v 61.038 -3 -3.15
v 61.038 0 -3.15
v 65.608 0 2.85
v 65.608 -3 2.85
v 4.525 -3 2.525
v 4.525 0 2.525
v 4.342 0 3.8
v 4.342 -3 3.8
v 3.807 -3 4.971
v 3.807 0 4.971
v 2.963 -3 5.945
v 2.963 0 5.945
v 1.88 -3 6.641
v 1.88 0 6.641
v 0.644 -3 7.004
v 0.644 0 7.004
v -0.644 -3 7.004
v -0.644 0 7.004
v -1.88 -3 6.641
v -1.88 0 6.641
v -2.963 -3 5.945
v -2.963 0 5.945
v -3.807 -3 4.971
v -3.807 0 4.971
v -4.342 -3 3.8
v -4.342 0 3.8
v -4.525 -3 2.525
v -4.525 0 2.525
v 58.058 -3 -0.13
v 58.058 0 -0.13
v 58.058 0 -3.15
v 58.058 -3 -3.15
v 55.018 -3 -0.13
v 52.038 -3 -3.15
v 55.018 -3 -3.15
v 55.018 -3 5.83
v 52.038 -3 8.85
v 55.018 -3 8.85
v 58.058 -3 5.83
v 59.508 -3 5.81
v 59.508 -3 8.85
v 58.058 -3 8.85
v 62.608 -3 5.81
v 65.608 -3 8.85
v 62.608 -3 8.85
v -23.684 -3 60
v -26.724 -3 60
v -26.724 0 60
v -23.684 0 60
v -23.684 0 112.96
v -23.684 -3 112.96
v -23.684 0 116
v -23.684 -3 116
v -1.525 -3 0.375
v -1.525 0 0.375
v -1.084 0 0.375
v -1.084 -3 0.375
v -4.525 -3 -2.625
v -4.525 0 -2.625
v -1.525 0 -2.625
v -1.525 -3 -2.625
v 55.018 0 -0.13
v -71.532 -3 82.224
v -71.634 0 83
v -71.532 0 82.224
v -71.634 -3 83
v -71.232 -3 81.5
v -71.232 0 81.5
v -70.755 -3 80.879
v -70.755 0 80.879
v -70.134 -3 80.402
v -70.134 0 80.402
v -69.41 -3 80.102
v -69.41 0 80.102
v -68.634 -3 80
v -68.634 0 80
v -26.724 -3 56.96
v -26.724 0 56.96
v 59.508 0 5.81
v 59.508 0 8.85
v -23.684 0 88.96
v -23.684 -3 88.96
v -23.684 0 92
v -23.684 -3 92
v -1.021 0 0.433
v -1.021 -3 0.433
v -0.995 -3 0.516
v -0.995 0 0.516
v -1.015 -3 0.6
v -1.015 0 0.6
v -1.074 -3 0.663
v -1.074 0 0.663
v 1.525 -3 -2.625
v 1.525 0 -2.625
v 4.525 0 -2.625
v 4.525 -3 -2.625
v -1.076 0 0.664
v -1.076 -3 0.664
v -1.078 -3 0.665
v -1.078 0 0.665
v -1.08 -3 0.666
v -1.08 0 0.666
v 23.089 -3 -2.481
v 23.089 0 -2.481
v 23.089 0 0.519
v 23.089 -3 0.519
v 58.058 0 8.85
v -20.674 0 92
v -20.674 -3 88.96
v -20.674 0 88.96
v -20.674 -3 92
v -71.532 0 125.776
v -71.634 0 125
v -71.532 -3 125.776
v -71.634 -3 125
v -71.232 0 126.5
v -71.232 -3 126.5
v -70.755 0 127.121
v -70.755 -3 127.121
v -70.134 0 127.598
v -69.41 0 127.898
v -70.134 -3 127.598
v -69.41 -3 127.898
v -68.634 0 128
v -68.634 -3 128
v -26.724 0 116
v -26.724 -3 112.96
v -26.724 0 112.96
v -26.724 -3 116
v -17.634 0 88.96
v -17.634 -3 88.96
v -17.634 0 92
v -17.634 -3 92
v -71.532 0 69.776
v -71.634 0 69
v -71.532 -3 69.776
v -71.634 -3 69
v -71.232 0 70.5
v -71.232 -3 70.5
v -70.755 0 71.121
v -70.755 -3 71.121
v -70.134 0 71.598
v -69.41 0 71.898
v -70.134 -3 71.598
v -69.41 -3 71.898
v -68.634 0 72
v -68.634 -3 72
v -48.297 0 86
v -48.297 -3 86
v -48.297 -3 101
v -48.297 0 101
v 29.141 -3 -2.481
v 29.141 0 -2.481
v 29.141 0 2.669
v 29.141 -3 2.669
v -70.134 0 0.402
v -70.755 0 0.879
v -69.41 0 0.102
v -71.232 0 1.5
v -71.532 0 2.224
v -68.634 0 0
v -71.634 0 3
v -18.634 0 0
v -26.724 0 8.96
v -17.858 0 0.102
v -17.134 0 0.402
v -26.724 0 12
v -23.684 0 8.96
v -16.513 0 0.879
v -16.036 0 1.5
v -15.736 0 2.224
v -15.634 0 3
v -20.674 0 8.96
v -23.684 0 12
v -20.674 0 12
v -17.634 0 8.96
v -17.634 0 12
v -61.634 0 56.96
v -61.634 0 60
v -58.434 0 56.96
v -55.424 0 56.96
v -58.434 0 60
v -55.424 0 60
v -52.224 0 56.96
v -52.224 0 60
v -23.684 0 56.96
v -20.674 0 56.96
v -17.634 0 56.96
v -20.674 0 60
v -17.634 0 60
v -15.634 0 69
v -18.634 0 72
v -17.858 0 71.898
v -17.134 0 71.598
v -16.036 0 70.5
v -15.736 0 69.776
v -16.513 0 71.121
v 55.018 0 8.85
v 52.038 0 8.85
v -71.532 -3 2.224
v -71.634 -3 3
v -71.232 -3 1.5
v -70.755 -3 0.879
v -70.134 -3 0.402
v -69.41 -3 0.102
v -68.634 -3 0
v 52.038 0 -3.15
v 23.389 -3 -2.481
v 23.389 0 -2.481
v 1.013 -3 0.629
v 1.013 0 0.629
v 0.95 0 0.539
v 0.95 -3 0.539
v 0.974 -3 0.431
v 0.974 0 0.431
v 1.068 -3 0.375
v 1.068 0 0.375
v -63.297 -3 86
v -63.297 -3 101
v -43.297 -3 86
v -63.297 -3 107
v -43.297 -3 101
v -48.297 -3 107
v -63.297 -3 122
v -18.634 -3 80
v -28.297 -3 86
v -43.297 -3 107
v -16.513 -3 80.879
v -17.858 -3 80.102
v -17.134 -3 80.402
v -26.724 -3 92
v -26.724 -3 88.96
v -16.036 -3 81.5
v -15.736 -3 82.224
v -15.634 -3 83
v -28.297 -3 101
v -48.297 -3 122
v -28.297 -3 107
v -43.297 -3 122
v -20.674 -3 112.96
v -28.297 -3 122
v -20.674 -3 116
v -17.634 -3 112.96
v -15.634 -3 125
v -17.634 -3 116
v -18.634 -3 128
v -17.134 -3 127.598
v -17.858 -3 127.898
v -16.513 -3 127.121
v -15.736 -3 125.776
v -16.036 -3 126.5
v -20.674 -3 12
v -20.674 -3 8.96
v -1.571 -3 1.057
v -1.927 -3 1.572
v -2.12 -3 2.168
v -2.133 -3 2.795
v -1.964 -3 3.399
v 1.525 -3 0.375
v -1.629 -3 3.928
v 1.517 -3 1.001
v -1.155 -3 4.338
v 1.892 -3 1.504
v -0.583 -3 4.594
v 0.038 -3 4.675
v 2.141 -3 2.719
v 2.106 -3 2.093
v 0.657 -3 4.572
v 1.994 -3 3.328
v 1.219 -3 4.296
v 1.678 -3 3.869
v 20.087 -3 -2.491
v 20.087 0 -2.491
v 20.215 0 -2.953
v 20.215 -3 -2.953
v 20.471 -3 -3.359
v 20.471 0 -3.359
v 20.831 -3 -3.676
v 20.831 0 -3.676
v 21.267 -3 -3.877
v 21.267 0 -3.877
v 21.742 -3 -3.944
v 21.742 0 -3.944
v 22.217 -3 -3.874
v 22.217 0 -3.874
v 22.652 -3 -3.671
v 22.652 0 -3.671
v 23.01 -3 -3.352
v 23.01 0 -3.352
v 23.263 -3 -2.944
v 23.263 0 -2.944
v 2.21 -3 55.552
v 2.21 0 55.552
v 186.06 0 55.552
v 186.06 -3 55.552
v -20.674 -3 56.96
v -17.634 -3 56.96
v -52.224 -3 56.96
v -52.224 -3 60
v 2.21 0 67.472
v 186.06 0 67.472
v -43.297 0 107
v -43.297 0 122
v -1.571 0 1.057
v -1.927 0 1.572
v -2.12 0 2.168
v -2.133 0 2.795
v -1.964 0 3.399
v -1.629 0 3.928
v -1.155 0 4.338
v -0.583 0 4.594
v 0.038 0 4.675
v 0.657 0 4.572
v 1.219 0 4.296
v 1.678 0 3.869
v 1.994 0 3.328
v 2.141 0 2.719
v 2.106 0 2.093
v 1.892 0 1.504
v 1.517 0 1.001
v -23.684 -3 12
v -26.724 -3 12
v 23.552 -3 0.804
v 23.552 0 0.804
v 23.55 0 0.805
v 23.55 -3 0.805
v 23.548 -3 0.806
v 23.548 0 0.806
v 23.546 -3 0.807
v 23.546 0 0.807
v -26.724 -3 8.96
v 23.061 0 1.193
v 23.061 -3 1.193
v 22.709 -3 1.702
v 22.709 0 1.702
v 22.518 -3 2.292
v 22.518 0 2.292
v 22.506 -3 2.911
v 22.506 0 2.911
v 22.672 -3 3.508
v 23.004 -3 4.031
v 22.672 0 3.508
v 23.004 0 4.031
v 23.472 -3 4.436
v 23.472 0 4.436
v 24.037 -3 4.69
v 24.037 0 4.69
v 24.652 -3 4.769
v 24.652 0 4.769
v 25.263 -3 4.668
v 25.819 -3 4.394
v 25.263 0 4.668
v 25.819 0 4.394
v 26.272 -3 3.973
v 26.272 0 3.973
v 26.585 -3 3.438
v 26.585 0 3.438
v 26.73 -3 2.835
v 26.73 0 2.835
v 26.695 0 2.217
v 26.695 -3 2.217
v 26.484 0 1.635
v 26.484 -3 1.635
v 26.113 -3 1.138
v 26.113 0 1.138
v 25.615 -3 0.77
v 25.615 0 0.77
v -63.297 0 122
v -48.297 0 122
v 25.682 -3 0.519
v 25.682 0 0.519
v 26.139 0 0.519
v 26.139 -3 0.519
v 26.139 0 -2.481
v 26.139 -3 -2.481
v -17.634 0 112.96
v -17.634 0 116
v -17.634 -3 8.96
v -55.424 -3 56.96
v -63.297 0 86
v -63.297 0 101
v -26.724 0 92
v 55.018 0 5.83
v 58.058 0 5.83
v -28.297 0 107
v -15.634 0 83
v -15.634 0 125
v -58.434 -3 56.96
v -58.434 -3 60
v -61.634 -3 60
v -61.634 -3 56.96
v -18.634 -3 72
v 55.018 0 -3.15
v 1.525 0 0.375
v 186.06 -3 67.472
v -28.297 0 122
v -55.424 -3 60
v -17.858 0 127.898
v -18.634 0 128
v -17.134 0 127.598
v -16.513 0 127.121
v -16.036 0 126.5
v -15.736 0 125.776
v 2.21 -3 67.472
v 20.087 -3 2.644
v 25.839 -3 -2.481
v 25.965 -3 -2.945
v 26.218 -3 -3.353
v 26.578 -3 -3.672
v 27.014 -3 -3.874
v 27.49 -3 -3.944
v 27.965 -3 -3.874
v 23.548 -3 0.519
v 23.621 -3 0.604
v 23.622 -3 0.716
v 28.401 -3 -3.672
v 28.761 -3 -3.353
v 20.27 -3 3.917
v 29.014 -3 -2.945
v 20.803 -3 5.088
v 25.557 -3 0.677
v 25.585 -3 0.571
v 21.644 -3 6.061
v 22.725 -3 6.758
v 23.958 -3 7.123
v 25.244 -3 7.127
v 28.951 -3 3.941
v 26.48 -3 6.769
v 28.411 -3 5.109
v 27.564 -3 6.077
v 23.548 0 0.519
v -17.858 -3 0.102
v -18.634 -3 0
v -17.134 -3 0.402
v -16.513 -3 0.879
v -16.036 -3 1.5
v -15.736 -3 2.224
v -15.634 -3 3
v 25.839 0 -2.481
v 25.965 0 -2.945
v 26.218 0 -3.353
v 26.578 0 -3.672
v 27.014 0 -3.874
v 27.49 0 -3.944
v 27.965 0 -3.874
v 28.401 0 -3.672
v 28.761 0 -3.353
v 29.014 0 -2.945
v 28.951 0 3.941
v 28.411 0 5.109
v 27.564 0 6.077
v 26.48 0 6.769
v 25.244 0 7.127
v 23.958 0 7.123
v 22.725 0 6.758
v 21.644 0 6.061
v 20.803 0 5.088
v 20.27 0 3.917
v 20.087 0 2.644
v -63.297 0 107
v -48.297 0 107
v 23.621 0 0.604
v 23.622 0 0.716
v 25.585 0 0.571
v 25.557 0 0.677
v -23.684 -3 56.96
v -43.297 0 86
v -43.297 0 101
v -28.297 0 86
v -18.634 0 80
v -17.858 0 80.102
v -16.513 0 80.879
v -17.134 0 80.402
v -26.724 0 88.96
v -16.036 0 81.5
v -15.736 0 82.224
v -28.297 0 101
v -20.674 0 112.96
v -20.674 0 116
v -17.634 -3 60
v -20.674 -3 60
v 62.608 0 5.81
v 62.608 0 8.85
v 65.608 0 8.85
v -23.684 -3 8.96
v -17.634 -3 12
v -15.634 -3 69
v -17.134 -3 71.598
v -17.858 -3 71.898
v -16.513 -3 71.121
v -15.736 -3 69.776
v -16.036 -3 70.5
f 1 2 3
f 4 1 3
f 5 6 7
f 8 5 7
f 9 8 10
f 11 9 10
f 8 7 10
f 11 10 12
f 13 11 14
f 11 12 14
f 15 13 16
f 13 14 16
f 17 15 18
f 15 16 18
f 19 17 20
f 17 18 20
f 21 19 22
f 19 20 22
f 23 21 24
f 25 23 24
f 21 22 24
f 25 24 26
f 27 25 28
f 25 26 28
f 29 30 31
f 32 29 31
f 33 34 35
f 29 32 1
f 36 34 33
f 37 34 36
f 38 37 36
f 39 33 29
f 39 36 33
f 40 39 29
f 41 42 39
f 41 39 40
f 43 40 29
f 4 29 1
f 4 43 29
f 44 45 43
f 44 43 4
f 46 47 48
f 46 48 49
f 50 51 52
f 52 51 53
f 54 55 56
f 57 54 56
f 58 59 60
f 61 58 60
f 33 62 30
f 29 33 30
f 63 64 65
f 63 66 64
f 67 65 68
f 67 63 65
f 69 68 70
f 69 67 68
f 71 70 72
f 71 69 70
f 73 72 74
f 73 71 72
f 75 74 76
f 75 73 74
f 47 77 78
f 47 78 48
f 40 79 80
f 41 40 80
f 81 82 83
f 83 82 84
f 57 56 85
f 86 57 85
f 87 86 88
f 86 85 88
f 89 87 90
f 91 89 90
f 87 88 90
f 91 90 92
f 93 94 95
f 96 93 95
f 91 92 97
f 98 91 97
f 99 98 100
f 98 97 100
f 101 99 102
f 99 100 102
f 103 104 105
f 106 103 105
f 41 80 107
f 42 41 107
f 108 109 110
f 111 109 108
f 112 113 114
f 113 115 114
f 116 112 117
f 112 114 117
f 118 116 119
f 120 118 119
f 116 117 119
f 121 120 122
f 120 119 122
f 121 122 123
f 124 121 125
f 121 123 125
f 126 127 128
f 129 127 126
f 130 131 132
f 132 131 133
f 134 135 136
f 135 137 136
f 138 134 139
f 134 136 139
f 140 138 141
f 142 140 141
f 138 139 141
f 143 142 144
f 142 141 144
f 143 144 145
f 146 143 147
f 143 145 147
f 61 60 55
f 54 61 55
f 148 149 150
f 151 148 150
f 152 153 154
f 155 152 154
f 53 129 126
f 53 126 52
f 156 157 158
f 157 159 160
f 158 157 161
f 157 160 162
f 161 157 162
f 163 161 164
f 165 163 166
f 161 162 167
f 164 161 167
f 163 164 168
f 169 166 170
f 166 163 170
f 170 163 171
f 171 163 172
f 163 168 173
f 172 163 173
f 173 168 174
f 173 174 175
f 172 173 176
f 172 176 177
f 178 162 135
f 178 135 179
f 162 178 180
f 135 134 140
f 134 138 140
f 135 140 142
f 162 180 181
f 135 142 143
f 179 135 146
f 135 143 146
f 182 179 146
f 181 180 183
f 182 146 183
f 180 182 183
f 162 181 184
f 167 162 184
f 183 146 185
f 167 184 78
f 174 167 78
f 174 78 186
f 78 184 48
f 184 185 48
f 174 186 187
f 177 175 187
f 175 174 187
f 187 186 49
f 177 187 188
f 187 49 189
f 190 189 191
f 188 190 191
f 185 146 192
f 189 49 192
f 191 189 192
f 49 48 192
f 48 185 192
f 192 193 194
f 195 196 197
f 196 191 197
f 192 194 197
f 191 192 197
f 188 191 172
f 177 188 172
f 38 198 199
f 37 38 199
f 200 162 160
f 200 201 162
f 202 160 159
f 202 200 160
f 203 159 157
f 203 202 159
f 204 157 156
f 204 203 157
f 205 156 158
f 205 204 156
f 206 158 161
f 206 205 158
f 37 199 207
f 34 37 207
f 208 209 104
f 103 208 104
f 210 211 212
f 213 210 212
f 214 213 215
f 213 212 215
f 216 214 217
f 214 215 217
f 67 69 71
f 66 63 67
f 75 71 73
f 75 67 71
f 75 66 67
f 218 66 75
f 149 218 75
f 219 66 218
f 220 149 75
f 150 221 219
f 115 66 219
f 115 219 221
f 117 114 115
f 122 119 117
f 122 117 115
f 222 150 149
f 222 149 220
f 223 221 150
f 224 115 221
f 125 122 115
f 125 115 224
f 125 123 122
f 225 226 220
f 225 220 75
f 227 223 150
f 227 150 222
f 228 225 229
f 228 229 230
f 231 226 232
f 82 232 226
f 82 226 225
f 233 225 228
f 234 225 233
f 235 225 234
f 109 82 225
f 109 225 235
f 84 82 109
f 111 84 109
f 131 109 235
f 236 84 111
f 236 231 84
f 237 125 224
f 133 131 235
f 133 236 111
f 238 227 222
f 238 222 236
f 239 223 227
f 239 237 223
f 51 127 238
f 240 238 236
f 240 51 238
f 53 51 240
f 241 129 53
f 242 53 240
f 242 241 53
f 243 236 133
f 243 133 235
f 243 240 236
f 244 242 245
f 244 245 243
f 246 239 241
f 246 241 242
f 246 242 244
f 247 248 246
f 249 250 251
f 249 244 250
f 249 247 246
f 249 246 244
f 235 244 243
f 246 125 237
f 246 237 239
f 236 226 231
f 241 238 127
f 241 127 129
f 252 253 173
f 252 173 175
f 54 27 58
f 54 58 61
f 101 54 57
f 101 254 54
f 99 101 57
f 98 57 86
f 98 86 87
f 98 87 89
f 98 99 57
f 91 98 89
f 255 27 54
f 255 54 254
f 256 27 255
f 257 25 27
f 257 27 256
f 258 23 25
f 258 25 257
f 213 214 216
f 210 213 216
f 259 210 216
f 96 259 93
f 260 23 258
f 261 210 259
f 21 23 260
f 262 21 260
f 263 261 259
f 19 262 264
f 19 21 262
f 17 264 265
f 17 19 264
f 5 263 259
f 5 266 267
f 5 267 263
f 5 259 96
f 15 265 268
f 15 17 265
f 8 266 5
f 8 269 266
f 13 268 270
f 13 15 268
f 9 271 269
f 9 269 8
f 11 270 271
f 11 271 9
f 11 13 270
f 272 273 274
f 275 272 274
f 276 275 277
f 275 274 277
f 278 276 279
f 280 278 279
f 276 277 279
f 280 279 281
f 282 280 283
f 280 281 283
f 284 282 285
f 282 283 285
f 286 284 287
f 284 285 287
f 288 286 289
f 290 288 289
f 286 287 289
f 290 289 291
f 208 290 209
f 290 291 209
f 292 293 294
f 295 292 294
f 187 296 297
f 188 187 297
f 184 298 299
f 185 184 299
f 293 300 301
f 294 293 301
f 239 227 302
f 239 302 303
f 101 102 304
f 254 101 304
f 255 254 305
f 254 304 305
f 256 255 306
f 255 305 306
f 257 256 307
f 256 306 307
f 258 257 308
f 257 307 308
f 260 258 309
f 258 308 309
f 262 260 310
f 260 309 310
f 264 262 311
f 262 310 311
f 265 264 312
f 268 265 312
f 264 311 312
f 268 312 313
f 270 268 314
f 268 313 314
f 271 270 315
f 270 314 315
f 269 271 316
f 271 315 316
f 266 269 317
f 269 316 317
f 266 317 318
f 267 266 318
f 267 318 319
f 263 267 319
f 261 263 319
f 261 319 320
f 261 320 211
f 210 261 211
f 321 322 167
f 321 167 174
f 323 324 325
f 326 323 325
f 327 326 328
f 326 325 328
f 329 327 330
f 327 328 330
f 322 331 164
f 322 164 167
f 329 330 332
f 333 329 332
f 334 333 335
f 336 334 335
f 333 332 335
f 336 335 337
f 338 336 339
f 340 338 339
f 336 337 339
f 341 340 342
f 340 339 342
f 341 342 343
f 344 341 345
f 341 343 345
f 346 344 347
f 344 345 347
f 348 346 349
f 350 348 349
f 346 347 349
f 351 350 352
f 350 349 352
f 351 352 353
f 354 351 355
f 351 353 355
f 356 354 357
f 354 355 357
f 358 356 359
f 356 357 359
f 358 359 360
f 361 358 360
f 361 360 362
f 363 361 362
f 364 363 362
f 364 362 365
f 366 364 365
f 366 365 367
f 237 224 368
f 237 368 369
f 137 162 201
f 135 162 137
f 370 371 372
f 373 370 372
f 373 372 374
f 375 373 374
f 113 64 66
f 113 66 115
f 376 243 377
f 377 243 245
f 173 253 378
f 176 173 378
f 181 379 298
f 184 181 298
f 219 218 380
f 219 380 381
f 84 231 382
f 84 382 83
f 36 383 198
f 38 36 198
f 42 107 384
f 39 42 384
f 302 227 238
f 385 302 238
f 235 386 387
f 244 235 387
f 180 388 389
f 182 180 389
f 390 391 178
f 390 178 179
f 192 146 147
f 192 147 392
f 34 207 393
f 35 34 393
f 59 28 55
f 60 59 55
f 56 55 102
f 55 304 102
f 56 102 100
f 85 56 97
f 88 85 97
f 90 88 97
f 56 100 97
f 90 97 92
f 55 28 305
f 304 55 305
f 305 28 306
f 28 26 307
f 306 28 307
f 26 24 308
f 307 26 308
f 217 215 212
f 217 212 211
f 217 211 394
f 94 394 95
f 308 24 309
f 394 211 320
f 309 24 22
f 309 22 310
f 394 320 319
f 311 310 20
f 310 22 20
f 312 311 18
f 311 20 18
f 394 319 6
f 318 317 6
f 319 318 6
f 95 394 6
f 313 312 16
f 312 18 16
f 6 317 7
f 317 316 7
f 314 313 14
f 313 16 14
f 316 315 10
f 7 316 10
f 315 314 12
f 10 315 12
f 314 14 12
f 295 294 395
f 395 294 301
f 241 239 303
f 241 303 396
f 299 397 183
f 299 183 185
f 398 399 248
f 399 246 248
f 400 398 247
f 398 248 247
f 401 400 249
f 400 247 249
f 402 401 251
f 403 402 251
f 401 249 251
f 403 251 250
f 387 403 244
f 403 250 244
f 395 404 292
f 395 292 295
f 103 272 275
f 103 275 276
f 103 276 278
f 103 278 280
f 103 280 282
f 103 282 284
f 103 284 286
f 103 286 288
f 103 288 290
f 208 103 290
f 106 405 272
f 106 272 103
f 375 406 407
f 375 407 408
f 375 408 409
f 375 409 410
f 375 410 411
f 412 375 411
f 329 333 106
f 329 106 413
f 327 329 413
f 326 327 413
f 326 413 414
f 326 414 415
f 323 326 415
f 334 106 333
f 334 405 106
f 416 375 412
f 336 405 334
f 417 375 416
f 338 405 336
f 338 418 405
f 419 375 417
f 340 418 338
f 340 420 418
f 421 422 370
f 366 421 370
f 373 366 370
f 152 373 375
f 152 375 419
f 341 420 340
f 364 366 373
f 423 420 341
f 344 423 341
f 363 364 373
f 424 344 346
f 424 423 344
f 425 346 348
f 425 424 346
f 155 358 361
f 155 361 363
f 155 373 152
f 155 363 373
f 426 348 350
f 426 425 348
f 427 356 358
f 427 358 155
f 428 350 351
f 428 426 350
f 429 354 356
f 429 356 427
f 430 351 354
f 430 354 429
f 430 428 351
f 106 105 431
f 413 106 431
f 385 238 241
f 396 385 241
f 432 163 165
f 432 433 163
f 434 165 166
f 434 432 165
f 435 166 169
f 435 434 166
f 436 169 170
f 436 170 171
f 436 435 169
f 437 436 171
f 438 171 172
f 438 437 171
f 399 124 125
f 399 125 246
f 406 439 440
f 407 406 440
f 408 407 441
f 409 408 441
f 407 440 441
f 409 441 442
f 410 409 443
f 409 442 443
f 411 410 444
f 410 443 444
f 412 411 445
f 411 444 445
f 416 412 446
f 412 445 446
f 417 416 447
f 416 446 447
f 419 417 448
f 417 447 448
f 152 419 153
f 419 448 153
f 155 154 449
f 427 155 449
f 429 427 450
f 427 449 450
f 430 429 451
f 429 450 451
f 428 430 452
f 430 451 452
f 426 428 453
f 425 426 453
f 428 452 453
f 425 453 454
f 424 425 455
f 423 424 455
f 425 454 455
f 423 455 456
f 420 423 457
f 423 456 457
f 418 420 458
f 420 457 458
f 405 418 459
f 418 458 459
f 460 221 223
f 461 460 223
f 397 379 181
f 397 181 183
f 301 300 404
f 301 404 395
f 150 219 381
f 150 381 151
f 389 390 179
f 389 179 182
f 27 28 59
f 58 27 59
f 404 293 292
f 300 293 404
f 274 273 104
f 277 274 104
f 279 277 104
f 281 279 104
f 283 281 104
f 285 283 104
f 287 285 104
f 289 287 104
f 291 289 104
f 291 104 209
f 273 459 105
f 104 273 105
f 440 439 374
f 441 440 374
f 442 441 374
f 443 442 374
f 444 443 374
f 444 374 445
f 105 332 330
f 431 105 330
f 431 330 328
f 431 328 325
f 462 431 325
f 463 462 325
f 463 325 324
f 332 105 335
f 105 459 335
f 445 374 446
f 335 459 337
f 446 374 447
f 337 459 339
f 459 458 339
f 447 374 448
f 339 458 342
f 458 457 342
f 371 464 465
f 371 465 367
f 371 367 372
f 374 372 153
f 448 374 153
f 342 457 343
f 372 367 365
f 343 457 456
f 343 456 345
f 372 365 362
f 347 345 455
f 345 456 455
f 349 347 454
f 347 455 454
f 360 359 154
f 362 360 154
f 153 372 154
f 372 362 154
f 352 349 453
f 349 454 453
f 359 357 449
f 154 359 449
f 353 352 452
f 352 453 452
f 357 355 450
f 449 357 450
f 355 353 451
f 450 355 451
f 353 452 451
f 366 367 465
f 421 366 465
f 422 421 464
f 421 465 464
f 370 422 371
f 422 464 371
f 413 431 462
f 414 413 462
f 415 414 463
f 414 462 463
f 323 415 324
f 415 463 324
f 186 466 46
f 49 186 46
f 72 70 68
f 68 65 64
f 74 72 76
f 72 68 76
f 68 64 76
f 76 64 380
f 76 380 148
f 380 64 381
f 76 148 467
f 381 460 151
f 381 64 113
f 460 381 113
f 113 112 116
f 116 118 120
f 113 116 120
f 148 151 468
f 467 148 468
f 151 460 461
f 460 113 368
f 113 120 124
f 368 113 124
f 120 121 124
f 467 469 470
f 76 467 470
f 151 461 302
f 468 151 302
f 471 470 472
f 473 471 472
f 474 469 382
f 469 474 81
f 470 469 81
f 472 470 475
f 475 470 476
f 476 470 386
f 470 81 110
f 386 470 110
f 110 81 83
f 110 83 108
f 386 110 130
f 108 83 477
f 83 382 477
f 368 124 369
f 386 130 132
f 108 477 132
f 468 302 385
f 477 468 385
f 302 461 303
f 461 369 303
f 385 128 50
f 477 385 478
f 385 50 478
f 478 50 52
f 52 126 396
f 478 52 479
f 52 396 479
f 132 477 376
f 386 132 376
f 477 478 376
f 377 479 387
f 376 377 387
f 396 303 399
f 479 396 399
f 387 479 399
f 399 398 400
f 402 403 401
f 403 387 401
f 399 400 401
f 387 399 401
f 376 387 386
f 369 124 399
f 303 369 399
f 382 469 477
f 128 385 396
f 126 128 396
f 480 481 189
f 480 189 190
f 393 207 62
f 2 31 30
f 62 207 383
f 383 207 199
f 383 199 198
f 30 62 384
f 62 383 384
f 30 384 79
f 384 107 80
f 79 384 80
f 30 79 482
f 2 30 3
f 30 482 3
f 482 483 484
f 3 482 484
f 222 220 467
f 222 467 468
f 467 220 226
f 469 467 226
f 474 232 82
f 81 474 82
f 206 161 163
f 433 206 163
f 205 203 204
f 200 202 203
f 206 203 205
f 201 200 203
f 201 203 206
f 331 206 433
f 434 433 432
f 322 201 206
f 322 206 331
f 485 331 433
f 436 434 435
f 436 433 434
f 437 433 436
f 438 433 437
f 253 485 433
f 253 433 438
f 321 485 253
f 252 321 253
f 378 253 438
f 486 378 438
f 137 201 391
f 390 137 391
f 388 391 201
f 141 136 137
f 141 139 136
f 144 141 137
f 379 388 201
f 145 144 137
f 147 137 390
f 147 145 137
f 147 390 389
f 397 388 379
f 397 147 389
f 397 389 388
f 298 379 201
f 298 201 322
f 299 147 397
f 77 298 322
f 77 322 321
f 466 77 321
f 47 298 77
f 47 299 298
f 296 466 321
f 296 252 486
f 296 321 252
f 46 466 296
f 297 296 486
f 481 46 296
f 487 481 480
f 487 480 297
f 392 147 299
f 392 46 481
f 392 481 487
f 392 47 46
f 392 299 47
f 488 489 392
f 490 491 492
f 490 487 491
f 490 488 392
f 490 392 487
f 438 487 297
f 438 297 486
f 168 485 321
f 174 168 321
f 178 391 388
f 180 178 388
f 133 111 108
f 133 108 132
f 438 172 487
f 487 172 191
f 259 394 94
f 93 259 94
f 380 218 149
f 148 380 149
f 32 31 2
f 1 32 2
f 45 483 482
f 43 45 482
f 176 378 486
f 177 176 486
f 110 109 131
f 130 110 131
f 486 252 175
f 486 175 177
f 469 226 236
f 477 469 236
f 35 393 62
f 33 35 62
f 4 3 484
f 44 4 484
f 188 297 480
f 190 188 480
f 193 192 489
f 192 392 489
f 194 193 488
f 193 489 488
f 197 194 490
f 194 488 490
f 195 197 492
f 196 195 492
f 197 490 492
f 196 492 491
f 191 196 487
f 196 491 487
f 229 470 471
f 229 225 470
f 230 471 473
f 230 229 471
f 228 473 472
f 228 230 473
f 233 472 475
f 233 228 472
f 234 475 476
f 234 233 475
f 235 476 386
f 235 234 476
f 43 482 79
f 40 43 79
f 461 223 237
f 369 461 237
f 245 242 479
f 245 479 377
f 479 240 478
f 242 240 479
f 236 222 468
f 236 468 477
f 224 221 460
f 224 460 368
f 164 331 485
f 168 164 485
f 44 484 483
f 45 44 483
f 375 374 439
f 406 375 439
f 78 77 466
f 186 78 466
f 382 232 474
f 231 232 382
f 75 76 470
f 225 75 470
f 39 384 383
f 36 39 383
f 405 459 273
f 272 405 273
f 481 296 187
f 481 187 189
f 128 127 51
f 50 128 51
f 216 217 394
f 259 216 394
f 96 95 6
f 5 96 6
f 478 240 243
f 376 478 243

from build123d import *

# Parameters (mm, degrees)
F1_DEPTH  = 3
F2_W      = 56
F2_H      = 48
F2_H_2    = 72
F3_DEPTH  = 3
F4_W      = 3.04
F4_H      = 3.04
F5_DEPTH  = 3.001
F4_W_2    = 3.2
F6_DEPTH  = 25
F7_W      = 15
F7_H      = 15
F8_DEPTH  = 3.001
F9_R      = 3
F10_W     = 183.85
F10_H     = 11.92
F11_DEPTH = 3


with BuildPart() as f1:
    # F0 (on Front) → F1 (new body)
    with BuildSketch(Plane.XZ):
        with BuildLine():
            ThreePointArc((-1.080397, 0.666172), (0.03848, 4.674656), (1.013178, 0.628695))
            ThreePointArc((1.013178, 0.628695), (0.950886, 0.482418), (1.068098, 0.375))
            Line((1.068098, 0.375), (1.1027, 0.375))
            Line((1.1027, 0.375), (1.525, 0.375))
            Line((1.525, 0.375), (1.525, -2.625))
            Line((1.525, -2.625), (4.525, -2.625))
            Line((4.525, -2.625), (4.525, 2.525))
            ThreePointArc((4.525, 2.525), (0, 7.05), (-4.525, 2.525))
            Line((-4.525, 2.525), (-4.525, -2.625))
            Line((-4.525, -2.625), (-1.525, -2.625))
            Line((-1.525, -2.625), (-1.525, 0.375))
            Line((-1.525, 0.375), (-1.084463, 0.375))
            ThreePointArc((-1.084463, 0.375), (-0.995149, 0.515884), (-1.074369, 0.662681))
            ThreePointArc((-1.074369, 0.662681), (-1.077384, 0.664424), (-1.080397, 0.666172))
        make_face()
        with BuildLine():
            ThreePointArc((23.545929, 0.807019), (24.651796, 4.768893), (25.61516, 0.769978))
            ThreePointArc((25.61516, 0.769978), (25.559911, 0.621037), (25.681861, 0.519233))
            Line((25.681861, 0.519233), (25.703969, 0.519233))
            Line((25.703969, 0.519233), (26.138763, 0.519233))
            Line((26.138763, 0.519233), (26.138763, -2.480767))
            Line((26.138763, -2.480767), (25.838763, -2.480767))
            ThreePointArc((25.838763, -2.480767), (27.489646, -3.943721), (29.140529, -2.480767))
            Line((29.140529, -2.480767), (29.140529, 2.669233))
            ThreePointArc((29.140529, 2.669233), (24.601263, 7.171051), (20.086928, 2.644233))
            Line((20.086928, 2.644233), (20.086928, -2.490617))
            ThreePointArc((20.086928, -2.490617), (21.742197, -3.944354), (23.388763, -2.480767))
            Line((23.388763, -2.480767), (23.088763, -2.480767))
            Line((23.088763, -2.480767), (23.088763, 0.519233))
            Line((23.088763, 0.519233), (23.54803, 0.519233))
            ThreePointArc((23.54803, 0.519233), (23.631228, 0.660299), (23.551887, 0.803569))
            ThreePointArc((23.551887, 0.803569), (23.548907, 0.805292), (23.545929, 0.807019))
        make_face()
        Polygon((58.058467, -3.149642), (61.038467, -3.149642), (65.608467, 2.850358), (65.608467, 8.850358), (62.608467, 8.850358), (62.608467, 5.810358), (59.508467, 5.810358), (59.508467, 8.850358), (58.058467, 8.850358), (58.058467, 5.830358), (55.018467, 5.830358), (55.018467, 8.850358), (52.038467, 8.850358), (52.038467, -3.149642), (55.018467, -3.149642), (55.018467, -0.129642), (58.058467, -0.129642), align=None)
    extrude(amount=F1_DEPTH)


with BuildPart() as f3:
    # F2 (on Front) → F3 (new body)
    with BuildSketch(Plane.XZ):
        with Locations((-43.634039, 104)):
            Rectangle(F2_W, F2_H)
        with Locations((-43.634039, 36)):
            Rectangle(F2_W, F2_H_2)
    extrude(amount=F3_DEPTH)

    # F4 (on face) → F5 (cut, through all)
    with BuildSketch(Plane.XZ.offset(3)):
        with Locations((-25.204039, 114.48)):
            Rectangle(F4_W, F4_H)
        with Locations((-19.154039, 114.48)):
            Rectangle(F4_W, F4_H)
        with Locations((-25.204039, 90.48)):
            Rectangle(F4_W, F4_H)
        with Locations((-19.154039, 90.48)):
            Rectangle(F4_W, F4_H)
        with Locations((-25.204039, 58.48)):
            Rectangle(F4_W, F4_H)
        with Locations((-19.154039, 58.48)):
            Rectangle(F4_W, F4_H)
        with Locations((-25.204039, 10.48)):
            Rectangle(F4_W, F4_H)
        with Locations((-19.154039, 10.48)):
            Rectangle(F4_W, F4_H)
    extrude(amount=-F5_DEPTH, mode=Mode.SUBTRACT)

    # F4 (on face) → F6 (cut)
    with BuildSketch(Plane.XZ.offset(3)):
        with Locations((-25.204039, 10.48)):
            Rectangle(F4_W, F4_H)
        with Locations((-19.154039, 10.48)):
            Rectangle(F4_W, F4_H)
        with Locations((-25.204039, 58.48)):
            Rectangle(F4_W, F4_H)
        with Locations((-19.154039, 58.48)):
            Rectangle(F4_W, F4_H)
        with Locations((-25.204039, 90.48)):
            Rectangle(F4_W, F4_H)
        with Locations((-19.154039, 90.48)):
            Rectangle(F4_W, F4_H)
        with Locations((-25.204039, 114.48)):
            Rectangle(F4_W, F4_H)
        with Locations((-19.154039, 114.48)):
            Rectangle(F4_W, F4_H)
        with Locations((-60.034039, 58.48)):
            Rectangle(F4_W_2, F4_H)
        with Locations((-53.824039, 58.48)):
            Rectangle(F4_W_2, F4_H)
    extrude(amount=-F6_DEPTH, mode=Mode.SUBTRACT)

    # F7 (on face) → F8 (cut, through all)
    with BuildSketch(Plane.XZ.offset(3)):
        with Locations((-55.797357, 114.5)):
            Rectangle(F7_W, F7_H)
        with Locations((-35.797357, 114.5)):
            Rectangle(F7_W, F7_H)
        with Locations((-35.797357, 93.5)):
            Rectangle(F7_W, F7_H)
        with Locations((-55.797357, 93.5)):
            Rectangle(F7_W, F7_H)
    extrude(amount=-F8_DEPTH, mode=Mode.SUBTRACT)

    # F9
    f9_edges = [f3.edges().sort_by_distance(p)[0] for p in [
        (-71.634039, -1.5, 128),
        (-71.634039, -1.5, 72),
        (-15.634039, -1.5, 72),
        (-71.634039, -1.5, 80),
        (-15.634039, -1.5, 80),
        (-15.634039, -1.5, 128),
        (-71.634039, -1.5, 0),
        (-15.634039, -1.5, 0),
    ]]
    fillet(f9_edges, radius=F9_R)


with BuildPart() as f11:
    # F10 (on Front) → F11 (new body)
    with BuildSketch(Plane.XZ):
        with Locations((94.134845, 61.512005)):
            Rectangle(F10_W, F10_H)
    extrude(amount=F11_DEPTH)


solid = Compound([f1.part, f3.part, f11.part])
